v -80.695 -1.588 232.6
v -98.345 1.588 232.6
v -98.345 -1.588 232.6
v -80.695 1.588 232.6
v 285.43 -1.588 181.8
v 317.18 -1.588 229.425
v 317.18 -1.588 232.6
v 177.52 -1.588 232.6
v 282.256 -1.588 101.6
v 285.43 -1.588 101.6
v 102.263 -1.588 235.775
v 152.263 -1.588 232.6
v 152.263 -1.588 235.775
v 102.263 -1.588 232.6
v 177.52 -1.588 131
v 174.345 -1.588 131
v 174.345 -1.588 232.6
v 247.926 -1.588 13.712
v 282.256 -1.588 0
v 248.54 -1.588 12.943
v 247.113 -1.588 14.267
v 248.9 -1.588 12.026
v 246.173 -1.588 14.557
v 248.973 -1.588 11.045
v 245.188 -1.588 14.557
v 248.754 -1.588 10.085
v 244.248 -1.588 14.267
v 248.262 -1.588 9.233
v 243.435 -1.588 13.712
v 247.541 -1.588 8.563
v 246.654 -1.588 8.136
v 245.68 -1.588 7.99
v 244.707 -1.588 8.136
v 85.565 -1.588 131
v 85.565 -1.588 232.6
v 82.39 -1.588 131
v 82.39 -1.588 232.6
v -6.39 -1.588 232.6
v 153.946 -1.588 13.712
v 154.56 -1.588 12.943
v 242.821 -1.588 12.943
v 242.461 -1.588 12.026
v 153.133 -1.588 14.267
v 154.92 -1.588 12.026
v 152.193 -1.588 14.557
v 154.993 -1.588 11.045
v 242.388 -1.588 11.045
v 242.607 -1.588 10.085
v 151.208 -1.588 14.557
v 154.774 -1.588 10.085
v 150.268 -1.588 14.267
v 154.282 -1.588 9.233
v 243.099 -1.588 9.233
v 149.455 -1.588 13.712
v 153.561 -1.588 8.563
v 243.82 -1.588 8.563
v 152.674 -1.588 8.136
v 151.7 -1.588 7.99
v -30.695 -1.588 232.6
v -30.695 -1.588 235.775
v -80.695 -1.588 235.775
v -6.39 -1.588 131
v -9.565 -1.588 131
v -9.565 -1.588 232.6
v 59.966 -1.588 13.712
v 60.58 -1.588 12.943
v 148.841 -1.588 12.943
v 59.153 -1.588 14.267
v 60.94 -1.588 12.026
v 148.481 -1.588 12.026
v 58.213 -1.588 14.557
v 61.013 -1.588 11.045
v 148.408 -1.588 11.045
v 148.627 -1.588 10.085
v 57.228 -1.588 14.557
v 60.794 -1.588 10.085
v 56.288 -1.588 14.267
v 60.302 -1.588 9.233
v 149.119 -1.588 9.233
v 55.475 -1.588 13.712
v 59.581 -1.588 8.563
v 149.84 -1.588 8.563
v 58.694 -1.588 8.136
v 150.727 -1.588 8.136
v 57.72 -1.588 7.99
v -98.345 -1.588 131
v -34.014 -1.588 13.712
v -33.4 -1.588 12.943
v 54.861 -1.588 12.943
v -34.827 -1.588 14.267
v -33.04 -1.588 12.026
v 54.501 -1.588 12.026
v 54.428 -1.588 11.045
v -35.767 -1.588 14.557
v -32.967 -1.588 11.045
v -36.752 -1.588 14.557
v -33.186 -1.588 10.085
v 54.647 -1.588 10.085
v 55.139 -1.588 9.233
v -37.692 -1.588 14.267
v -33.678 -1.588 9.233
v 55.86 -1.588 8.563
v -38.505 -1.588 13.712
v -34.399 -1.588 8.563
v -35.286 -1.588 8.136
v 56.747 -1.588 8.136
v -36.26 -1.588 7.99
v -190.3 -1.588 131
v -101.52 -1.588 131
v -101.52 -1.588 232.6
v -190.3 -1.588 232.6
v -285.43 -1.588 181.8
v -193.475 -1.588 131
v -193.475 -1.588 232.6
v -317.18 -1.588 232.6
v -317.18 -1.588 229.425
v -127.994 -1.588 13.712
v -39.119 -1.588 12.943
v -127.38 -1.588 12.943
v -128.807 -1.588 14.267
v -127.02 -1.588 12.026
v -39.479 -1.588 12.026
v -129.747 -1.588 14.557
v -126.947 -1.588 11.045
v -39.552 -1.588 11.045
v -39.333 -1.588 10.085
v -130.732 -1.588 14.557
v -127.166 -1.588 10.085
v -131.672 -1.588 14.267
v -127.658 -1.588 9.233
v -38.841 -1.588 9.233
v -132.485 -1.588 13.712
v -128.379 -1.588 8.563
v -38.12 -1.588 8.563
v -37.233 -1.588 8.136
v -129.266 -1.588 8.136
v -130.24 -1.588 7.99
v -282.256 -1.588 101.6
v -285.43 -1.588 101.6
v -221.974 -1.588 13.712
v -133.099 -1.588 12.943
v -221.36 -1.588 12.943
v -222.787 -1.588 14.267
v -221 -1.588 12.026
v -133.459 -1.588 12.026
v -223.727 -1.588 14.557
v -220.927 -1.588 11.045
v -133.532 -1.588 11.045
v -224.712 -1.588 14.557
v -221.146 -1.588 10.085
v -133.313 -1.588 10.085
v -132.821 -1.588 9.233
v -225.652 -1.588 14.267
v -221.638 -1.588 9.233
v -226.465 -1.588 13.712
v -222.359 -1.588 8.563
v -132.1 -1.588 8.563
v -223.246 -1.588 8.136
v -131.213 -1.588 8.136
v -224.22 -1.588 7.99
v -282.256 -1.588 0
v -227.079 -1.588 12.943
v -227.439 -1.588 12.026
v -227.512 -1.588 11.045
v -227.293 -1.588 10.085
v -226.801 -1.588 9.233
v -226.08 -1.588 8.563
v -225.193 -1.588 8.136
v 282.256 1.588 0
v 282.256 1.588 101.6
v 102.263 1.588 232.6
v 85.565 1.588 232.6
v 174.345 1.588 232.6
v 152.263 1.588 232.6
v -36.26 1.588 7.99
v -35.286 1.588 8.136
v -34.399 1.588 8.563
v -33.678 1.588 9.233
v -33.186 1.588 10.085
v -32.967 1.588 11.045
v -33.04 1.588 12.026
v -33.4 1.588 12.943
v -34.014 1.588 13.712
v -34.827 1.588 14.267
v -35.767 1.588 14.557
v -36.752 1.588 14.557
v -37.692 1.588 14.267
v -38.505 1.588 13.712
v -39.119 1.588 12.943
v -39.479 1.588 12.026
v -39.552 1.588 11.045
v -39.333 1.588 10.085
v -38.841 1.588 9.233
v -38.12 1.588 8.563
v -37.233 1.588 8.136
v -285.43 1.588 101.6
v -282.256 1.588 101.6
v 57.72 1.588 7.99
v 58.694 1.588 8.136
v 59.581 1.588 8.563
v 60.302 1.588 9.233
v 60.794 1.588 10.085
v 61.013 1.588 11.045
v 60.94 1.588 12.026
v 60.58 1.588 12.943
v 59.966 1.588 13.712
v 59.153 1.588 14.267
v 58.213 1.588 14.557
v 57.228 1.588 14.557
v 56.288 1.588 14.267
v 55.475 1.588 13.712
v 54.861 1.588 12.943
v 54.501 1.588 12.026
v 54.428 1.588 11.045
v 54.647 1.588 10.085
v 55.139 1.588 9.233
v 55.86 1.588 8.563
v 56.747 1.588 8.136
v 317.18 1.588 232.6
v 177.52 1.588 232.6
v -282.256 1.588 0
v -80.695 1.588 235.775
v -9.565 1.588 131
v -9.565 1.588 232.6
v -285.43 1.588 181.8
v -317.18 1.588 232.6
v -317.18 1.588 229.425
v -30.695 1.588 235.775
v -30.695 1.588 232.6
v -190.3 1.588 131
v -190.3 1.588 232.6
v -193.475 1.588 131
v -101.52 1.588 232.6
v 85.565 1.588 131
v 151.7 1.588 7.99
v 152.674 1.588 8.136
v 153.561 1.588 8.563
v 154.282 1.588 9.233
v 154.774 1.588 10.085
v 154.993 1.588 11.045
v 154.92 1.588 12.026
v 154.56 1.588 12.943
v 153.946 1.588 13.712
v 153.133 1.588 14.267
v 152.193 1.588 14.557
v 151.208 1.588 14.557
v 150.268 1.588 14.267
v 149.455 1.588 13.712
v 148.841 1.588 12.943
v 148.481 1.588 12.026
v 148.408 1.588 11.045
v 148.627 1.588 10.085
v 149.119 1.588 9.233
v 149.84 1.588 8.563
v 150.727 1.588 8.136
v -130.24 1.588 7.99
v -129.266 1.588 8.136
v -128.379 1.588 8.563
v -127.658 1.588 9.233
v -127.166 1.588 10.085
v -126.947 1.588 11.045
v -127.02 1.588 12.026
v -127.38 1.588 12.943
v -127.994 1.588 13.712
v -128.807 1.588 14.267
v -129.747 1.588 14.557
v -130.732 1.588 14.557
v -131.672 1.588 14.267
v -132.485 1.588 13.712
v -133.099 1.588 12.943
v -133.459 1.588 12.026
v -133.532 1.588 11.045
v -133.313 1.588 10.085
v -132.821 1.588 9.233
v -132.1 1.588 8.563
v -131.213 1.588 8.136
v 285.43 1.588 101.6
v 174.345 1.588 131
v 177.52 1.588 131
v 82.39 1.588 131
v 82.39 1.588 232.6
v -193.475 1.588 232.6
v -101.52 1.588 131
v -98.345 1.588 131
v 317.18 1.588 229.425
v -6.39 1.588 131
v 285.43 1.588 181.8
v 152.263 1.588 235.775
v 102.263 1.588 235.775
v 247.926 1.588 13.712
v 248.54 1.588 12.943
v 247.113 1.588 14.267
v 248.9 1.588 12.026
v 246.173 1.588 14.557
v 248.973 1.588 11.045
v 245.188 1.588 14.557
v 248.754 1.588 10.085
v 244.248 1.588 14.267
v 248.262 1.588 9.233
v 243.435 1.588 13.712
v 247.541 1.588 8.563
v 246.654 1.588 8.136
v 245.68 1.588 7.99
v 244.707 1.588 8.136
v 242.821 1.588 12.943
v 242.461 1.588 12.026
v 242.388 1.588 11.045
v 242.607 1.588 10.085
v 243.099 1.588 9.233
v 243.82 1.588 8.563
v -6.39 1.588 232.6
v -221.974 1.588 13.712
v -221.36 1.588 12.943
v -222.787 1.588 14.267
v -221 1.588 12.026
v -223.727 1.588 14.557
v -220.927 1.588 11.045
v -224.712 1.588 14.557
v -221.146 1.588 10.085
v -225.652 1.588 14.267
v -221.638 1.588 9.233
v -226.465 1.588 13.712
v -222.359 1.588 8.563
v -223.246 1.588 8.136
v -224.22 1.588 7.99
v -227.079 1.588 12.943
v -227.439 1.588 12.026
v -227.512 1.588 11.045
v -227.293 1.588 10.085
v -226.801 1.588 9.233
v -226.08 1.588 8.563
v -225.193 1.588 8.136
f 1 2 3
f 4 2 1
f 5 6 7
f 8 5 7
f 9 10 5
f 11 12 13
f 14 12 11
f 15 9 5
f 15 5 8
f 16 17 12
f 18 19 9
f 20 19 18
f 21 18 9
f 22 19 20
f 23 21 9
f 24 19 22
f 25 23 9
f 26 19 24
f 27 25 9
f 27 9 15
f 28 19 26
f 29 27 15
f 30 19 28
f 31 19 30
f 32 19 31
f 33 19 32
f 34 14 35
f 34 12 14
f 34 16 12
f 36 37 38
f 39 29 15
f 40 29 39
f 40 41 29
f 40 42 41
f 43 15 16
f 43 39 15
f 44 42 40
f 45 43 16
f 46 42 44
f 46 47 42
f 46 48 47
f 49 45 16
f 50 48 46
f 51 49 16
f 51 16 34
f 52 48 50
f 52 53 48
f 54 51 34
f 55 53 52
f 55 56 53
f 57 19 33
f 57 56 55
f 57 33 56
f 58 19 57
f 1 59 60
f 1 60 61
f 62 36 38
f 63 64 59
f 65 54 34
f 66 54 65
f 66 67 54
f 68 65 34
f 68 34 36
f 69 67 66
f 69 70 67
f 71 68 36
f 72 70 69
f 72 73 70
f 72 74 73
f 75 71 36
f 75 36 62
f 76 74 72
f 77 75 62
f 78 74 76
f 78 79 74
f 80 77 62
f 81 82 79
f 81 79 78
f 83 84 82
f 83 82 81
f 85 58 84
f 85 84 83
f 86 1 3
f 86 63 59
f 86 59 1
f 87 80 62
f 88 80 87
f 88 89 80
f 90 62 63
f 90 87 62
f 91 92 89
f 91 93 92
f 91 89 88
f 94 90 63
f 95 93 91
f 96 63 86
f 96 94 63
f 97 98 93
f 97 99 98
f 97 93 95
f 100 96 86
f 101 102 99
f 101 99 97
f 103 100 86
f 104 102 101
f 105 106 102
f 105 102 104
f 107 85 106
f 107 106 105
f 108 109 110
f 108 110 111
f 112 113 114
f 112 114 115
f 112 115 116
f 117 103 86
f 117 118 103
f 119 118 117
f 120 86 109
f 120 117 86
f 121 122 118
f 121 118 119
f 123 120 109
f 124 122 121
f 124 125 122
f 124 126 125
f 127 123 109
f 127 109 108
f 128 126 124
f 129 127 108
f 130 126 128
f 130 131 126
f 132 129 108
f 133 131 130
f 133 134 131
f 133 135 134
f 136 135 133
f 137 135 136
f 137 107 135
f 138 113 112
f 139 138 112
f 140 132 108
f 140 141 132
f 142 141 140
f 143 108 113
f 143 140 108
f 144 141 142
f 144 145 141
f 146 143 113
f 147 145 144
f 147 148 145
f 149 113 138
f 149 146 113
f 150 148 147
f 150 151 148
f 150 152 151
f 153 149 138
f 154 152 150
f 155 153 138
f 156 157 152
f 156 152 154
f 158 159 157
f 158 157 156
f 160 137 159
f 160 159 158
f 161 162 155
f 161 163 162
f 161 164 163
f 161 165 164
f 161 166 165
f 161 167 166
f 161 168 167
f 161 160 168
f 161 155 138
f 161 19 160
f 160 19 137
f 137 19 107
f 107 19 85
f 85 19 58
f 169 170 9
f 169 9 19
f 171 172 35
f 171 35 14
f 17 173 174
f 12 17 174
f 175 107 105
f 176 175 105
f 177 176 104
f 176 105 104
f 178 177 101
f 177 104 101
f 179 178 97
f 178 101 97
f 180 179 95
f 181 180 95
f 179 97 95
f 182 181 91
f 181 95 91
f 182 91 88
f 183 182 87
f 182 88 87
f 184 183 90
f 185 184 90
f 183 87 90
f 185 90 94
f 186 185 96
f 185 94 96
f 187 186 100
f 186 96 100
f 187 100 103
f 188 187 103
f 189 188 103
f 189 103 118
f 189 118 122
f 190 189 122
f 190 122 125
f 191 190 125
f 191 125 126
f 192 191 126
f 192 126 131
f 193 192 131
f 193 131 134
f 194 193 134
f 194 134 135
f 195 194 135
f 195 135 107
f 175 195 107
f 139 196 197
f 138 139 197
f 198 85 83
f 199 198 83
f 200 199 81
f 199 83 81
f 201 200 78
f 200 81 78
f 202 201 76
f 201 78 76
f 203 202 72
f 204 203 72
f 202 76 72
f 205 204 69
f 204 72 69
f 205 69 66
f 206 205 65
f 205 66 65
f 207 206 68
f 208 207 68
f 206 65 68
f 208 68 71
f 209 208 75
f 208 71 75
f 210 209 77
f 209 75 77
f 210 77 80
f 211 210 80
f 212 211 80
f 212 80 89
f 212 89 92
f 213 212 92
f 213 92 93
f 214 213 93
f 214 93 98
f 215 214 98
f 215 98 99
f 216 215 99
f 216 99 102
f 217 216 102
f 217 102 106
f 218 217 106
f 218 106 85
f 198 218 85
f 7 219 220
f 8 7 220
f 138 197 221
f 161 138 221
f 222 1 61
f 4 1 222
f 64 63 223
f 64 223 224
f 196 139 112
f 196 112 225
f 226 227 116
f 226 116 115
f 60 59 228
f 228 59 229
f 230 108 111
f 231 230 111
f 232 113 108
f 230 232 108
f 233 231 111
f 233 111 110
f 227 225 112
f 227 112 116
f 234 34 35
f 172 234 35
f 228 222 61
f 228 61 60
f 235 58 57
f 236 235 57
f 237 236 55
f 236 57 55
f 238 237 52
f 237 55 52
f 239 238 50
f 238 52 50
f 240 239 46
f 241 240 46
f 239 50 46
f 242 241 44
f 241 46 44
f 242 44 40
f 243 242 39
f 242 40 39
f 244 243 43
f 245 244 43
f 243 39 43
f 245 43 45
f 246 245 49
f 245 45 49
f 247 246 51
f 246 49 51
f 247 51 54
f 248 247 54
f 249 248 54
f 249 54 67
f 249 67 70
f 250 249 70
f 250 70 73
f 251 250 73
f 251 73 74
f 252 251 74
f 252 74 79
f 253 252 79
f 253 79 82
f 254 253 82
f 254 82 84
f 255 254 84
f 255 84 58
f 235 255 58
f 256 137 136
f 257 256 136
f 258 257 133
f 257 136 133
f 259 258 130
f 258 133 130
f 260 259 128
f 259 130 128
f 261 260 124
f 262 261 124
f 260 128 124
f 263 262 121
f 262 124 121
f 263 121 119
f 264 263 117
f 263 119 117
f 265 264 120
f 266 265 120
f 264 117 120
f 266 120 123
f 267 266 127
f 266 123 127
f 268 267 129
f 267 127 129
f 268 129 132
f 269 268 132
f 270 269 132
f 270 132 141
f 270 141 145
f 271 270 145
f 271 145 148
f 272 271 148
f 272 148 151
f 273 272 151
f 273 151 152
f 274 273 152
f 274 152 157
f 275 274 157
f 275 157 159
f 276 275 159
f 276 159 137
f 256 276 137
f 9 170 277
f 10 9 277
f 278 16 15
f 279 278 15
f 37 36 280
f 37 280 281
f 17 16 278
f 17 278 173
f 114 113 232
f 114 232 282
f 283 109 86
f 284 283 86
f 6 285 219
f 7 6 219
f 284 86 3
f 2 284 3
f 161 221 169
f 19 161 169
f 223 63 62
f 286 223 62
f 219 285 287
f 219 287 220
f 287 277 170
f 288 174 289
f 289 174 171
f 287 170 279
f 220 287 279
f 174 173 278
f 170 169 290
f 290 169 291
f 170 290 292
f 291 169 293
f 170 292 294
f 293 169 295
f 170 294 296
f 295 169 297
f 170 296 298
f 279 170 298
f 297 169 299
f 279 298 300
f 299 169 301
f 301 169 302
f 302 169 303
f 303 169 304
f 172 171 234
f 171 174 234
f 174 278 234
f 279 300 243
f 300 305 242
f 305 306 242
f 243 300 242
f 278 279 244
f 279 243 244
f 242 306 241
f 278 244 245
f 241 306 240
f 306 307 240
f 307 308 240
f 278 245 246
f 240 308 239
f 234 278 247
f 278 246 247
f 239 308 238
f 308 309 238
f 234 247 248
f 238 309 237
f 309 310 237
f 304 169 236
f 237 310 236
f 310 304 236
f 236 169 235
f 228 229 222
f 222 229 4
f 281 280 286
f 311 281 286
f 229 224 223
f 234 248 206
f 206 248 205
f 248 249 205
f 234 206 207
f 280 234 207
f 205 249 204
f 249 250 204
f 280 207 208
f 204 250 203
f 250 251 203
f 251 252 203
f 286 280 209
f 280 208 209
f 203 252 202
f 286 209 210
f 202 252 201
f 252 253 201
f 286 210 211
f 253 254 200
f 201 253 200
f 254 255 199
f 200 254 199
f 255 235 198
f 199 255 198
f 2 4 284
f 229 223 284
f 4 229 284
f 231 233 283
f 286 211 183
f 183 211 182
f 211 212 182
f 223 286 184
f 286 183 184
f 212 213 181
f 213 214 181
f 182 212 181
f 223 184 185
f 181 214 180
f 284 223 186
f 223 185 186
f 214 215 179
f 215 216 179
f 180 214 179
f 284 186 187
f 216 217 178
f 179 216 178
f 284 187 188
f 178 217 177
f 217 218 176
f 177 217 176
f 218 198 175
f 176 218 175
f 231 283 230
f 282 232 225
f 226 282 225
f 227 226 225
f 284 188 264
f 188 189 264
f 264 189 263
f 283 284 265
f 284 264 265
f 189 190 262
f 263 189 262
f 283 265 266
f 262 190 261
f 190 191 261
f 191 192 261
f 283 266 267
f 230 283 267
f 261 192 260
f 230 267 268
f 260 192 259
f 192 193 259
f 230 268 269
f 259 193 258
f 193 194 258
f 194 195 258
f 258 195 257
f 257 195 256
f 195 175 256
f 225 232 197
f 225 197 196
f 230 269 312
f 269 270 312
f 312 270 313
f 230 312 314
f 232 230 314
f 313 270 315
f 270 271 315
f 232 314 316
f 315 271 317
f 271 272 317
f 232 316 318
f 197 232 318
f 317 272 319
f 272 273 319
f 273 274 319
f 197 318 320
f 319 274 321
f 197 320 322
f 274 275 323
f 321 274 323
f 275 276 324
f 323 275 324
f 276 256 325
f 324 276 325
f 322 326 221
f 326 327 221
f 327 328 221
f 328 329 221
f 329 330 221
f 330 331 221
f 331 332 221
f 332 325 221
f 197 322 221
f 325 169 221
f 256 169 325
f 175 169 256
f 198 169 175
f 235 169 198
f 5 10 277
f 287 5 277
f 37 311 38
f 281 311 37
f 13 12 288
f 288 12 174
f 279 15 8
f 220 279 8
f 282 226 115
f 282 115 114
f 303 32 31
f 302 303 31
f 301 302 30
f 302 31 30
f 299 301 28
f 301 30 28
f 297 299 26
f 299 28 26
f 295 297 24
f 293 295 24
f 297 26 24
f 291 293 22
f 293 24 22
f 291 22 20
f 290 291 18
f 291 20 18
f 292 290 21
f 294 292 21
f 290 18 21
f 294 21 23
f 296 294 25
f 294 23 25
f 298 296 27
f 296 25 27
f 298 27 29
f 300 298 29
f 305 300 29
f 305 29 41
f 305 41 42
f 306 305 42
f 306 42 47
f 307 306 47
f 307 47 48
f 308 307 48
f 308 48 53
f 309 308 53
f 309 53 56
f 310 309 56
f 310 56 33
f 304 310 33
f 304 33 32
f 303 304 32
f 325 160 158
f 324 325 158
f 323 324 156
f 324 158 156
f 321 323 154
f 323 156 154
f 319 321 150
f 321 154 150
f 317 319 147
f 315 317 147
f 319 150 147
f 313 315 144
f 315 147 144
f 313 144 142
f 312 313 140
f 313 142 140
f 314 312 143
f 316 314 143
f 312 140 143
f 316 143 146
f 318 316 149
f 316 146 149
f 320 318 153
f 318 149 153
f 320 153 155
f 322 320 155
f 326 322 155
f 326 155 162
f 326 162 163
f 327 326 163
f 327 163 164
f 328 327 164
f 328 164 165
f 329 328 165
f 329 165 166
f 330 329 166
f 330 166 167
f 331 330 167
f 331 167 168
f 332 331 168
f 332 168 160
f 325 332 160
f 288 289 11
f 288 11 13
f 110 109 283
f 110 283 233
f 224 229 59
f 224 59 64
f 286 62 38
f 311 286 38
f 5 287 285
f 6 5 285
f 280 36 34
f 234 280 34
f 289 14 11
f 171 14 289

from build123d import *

# Parameters (mm, degrees)
SKETCH1_W           = 570.861
SKETCH1_H           = 3.175
BOSS_EXTRUDE1_DEPTH = 232.6
SKETCH7_R           = 3.302
CUT_EXTRUDE4_DEPTH  = 369.216527271
SKETCH6_W           = 50
SKETCH6_H           = 3.175
BOSS_EXTRUDE2_DEPTH = 3.175
LPATTERN1_COUNT     = 6
LPATTERN1_PITCH     = 93.98
SKETCH2_W           = 3.175
SKETCH2_H           = 101.6
CUT_EXTRUDE5_DEPTH  = 371.230335845
BOSS_EXTRUDE3_DEPTH = 3.175
SKETCH13_W          = 3.175
SKETCH13_H          = 101.6
CUT_EXTRUDE6_DEPTH  = 396.22575932
LPATTERN2_COUNT     = 5
LPATTERN2_PITCH     = 91.9550104


with BuildPart() as part:
    # Sketch1 → Boss-Extrude1 (new body)
    with BuildSketch(Plane.XY):
        Rectangle(SKETCH1_W, SKETCH1_H)
    extrude(amount=BOSS_EXTRUDE1_DEPTH)

    # Sketch7 → Cut-Extrude4 (cut, through all)
    with BuildSketch(Plane(origin=(0, -1.5875, 0), x_dir=(-1, 0, 0), z_dir=(0, -1, 0))):
        with Locations((-245.6805, -11.29165)):
            Circle(SKETCH7_R)
    cut_extrude4 = extrude(amount=-CUT_EXTRUDE4_DEPTH, mode=Mode.SUBTRACT)

    # Sketch6 → Boss-Extrude2 (add)
    with BuildSketch(Plane.XY.offset(232.6)):
        with Locations((127.26300405, 0)):
            Rectangle(SKETCH6_W, SKETCH6_H)
        with Locations((-55.6950692, 0)):
            Rectangle(SKETCH6_W, SKETCH6_H)
    extrude(amount=BOSS_EXTRUDE2_DEPTH)

    # LPattern1: Cut-Extrude4 ×6
    with Locations(*[(-i * LPATTERN1_PITCH, 0, 0) for i in range(1, LPATTERN1_COUNT)]):
        add(cut_extrude4, mode=Mode.SUBTRACT)

    # Sketch2 → Cut-Extrude5 (cut, through all)
    with BuildSketch(Plane(origin=(0, 1.5875, 0), x_dir=(1, 0, 0), z_dir=(0, 1, 0))):
        with Locations((283.843, -50.8)):
            Rectangle(SKETCH2_W, SKETCH2_H)
        with Locations((-283.843, -50.8)):
            Rectangle(SKETCH2_W, SKETCH2_H)
    extrude(amount=-CUT_EXTRUDE5_DEPTH, mode=Mode.SUBTRACT)

    # Sketch12 → Boss-Extrude3 (add)
    with BuildSketch(Plane(origin=(0, 1.5875, 0), x_dir=(1, 0, 0), z_dir=(0, 1, 0))):
        Polygon((-317.1805, -232.6), (-285.4305, -232.6), (-285.4305, -181.8), (-317.1805, -229.425), align=None)
    boss_extrude3 = extrude(amount=-BOSS_EXTRUDE3_DEPTH)

    # Mirror1: Boss-Extrude3 across plane
    add(boss_extrude3.mirror(Plane(origin=(0, 0, 0), x_dir=(0, 0, 1), z_dir=(1, 0, 0))))

    # Sketch13 → Cut-Extrude6 (cut, through all)
    with BuildSketch(Plane.XZ.offset(1.5875)):
        with Locations((-191.8879896, 181.8)):
            Rectangle(SKETCH13_W, SKETCH13_H)
    cut_extrude6 = extrude(amount=-CUT_EXTRUDE6_DEPTH, mode=Mode.SUBTRACT)

    # LPattern2: Cut-Extrude6 ×5
    with Locations(*[(i * LPATTERN2_PITCH, 0, 0) for i in range(1, LPATTERN2_COUNT)]):
        add(cut_extrude6, mode=Mode.SUBTRACT)


solid = part.part
